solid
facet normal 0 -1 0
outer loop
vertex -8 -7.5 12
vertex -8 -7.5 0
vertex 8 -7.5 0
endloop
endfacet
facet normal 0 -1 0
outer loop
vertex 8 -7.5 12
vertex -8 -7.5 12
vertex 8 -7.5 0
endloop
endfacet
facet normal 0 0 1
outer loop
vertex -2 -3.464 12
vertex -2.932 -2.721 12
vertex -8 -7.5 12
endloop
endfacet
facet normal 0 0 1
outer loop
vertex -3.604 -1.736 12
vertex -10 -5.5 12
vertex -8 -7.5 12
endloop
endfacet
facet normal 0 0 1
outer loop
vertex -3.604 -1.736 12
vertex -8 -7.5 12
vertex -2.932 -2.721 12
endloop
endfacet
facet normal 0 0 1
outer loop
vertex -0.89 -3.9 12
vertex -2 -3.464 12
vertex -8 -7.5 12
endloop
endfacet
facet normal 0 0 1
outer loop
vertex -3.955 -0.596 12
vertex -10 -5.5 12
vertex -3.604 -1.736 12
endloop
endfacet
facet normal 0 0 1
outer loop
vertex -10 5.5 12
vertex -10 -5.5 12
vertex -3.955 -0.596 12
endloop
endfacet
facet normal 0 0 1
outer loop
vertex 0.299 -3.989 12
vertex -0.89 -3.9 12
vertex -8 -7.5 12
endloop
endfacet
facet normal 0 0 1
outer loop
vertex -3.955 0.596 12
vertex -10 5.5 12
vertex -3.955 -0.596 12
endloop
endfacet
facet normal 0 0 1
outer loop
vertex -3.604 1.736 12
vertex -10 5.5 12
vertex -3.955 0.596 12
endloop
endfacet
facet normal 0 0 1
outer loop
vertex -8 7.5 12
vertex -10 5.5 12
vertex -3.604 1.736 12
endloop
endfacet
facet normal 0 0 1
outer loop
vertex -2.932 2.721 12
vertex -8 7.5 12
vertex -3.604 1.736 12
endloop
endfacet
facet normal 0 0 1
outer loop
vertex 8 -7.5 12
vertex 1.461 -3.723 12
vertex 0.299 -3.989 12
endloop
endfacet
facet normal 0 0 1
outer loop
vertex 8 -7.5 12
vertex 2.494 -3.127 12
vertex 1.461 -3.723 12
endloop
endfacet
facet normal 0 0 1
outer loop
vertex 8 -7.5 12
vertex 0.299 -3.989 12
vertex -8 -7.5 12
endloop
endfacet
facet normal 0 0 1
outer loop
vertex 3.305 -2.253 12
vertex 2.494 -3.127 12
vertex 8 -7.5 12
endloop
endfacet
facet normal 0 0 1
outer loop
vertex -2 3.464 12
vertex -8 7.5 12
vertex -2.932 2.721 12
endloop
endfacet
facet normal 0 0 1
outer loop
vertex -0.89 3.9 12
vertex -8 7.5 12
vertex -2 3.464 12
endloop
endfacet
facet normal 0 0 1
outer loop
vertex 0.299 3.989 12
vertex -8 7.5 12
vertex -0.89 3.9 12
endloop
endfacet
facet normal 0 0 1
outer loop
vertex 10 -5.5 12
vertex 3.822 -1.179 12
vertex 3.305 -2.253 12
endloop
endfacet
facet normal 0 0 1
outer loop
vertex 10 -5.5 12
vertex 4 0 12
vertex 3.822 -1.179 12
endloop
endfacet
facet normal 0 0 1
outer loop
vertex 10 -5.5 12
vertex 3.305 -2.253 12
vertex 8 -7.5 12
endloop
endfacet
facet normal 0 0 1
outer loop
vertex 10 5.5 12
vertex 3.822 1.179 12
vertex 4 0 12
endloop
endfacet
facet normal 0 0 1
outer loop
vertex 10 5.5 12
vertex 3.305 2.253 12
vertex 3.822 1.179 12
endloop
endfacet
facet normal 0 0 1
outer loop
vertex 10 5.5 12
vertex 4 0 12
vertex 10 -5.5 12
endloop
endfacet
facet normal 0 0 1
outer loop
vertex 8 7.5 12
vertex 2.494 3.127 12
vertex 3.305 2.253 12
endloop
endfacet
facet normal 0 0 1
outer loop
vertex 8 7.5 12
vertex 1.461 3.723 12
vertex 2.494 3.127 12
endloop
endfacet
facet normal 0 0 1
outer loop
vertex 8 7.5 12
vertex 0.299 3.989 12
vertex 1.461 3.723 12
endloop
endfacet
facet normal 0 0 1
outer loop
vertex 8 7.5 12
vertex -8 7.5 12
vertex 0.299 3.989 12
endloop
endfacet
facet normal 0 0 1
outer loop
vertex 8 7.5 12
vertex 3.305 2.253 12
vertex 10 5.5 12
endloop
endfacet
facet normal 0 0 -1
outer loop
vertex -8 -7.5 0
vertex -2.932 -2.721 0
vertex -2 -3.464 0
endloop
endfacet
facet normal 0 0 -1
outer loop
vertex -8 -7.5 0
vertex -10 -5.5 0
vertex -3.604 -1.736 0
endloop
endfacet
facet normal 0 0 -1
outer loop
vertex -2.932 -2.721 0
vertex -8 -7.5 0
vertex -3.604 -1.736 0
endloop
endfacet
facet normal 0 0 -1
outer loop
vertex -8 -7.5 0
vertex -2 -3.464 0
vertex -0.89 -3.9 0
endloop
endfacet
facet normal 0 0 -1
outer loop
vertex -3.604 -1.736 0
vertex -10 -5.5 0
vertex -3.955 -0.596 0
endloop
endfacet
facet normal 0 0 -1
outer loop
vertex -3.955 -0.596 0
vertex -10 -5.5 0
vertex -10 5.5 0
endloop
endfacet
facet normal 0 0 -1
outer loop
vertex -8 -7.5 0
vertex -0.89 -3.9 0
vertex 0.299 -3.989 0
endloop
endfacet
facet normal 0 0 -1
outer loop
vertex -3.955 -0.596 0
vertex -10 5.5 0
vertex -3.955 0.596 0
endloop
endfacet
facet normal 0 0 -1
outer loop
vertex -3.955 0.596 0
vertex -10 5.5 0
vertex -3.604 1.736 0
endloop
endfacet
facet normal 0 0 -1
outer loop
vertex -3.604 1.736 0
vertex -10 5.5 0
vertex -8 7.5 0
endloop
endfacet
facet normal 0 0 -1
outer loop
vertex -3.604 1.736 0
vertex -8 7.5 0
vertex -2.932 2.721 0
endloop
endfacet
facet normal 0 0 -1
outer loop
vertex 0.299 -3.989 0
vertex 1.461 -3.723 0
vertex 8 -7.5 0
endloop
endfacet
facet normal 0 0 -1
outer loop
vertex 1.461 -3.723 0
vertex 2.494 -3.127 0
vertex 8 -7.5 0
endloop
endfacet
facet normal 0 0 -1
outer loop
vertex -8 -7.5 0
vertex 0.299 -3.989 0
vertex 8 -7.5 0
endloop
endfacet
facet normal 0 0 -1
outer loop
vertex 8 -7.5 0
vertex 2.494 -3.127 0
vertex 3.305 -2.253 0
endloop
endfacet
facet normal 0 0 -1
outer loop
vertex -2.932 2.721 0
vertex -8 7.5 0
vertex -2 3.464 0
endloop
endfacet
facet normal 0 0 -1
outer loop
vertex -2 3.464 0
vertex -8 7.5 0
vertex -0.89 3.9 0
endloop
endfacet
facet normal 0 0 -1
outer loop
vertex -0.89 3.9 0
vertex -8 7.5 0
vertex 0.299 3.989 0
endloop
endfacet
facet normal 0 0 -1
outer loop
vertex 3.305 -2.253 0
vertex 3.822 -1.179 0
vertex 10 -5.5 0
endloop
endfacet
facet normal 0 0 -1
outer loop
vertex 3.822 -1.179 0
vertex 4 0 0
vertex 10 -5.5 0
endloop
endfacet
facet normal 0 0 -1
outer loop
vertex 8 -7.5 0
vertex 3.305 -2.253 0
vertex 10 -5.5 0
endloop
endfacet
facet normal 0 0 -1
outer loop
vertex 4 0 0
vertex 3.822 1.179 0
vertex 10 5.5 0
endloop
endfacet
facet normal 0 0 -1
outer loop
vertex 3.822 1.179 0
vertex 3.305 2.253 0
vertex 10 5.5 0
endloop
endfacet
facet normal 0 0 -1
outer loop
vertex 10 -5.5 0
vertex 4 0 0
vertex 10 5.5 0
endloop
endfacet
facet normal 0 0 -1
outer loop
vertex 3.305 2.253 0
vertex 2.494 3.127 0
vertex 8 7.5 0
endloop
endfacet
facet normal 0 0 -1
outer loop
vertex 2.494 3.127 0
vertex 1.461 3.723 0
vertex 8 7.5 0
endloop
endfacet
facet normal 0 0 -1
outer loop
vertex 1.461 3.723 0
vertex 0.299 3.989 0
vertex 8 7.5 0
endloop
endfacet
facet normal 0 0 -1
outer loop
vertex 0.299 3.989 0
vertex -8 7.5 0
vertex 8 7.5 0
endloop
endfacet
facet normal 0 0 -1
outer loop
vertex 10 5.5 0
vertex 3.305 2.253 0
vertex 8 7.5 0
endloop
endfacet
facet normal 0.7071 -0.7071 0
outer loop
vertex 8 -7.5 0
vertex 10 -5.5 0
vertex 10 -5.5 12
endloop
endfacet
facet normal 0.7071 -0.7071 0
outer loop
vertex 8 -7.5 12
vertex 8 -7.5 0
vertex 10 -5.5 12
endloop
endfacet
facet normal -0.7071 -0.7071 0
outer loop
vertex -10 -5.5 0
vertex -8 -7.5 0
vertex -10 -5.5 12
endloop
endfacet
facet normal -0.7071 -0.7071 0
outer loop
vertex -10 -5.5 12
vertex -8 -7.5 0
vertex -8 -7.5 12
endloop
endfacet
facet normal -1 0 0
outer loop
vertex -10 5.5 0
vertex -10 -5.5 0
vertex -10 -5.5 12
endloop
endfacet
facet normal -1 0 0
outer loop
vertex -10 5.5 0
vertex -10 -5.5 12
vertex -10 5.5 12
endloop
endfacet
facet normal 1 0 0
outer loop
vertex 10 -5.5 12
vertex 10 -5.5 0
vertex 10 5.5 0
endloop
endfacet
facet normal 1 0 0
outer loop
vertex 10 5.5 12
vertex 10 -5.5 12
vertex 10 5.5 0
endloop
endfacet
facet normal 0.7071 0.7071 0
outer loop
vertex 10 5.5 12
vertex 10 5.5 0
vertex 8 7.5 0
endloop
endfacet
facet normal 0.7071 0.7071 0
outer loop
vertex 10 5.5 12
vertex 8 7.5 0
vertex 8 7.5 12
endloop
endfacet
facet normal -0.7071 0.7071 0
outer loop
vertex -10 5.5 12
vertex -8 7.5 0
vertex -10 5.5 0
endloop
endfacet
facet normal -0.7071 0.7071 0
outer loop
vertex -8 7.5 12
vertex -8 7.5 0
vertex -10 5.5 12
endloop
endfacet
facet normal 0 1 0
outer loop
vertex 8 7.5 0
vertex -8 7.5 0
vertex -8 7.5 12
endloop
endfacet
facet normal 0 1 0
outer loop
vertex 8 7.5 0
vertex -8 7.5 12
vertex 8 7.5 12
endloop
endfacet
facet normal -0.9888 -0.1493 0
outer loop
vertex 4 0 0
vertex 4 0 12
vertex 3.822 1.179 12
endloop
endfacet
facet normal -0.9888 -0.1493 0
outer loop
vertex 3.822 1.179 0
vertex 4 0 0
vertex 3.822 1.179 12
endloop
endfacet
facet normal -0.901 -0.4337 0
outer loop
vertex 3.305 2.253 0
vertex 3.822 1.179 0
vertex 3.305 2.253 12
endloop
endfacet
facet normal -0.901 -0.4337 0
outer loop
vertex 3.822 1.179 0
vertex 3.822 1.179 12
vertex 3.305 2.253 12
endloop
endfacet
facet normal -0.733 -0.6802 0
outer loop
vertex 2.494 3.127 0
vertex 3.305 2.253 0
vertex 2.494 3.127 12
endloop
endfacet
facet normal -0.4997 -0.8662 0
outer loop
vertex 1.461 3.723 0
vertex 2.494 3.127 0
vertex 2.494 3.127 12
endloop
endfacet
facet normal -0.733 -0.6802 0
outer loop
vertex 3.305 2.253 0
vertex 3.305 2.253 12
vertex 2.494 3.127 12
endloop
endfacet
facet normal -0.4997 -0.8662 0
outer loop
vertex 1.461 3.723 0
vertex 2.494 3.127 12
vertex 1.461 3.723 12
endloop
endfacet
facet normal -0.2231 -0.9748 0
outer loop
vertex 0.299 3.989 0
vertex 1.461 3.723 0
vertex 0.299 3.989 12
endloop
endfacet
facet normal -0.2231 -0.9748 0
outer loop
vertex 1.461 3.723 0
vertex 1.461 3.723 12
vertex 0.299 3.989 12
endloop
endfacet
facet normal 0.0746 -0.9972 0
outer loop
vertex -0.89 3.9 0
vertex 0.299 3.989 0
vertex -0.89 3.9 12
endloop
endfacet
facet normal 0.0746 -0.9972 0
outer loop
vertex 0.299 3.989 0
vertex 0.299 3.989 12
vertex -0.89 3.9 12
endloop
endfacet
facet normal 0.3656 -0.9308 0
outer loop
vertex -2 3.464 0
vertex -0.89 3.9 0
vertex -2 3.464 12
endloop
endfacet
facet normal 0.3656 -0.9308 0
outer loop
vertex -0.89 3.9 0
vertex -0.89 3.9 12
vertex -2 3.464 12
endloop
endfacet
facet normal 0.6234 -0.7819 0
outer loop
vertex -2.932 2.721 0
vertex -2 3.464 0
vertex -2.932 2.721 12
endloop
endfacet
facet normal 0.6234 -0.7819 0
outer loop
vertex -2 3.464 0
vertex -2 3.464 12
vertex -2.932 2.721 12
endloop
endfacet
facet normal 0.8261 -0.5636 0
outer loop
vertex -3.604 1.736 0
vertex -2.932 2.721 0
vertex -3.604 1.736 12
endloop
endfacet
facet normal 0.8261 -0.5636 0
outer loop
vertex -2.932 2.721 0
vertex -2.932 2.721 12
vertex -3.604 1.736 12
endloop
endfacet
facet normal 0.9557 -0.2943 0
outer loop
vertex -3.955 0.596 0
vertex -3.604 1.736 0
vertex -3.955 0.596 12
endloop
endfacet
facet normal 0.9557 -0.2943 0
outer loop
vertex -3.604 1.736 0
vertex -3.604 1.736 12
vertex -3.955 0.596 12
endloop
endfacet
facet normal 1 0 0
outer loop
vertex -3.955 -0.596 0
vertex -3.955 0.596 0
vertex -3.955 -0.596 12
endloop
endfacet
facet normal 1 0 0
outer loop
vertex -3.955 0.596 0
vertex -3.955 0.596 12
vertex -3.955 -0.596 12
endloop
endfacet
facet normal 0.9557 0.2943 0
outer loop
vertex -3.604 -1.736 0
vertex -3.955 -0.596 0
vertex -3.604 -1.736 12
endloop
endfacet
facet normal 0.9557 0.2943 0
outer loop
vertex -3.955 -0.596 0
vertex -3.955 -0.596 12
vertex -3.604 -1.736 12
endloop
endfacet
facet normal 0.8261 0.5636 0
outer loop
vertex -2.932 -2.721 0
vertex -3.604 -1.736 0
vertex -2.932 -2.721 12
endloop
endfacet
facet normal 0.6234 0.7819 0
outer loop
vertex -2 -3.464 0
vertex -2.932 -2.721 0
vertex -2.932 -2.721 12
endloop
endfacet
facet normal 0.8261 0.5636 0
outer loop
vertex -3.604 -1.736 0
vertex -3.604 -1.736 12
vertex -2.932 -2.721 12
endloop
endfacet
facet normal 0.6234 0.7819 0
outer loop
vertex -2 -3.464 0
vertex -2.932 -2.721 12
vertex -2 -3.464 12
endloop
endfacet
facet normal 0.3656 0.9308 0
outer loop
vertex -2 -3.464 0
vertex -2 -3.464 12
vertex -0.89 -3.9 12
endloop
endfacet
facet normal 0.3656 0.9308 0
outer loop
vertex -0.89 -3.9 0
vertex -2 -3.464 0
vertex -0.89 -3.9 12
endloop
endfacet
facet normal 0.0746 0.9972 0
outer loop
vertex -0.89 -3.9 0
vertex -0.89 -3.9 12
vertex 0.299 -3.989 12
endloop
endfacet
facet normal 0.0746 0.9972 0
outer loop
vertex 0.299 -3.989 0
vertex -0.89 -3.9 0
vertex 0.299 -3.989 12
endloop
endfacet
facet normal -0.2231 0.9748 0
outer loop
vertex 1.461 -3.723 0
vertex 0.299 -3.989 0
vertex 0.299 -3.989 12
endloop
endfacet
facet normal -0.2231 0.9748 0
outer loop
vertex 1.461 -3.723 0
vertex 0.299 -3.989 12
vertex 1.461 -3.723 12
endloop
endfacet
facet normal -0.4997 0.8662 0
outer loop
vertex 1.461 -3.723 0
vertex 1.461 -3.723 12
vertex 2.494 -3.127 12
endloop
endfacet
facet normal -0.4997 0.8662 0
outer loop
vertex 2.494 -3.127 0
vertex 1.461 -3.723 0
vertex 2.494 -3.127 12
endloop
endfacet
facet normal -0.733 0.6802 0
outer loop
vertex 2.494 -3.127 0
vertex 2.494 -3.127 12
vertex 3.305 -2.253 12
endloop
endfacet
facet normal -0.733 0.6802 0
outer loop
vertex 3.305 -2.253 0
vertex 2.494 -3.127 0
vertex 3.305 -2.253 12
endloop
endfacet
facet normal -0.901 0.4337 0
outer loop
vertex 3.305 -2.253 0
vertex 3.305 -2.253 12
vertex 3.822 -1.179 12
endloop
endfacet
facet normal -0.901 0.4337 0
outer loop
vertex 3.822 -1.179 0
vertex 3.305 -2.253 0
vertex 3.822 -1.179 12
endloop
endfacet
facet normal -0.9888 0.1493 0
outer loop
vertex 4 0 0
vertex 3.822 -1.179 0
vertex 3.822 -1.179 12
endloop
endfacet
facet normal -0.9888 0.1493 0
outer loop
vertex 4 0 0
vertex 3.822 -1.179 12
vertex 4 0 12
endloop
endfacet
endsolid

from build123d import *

# Parameters (mm, degrees)
SKETCH1_W           = 20
SKETCH1_H           = 15
BOSS_EXTRUDE1_DEPTH = 12
SKETCH2_R           = 4
CUT_EXTRUDE1_DEPTH  = 13
CHAMFER1_SIZE       = 2


with BuildPart() as part:
    # Sketch1 → Boss-Extrude1 (new body)
    with BuildSketch(Plane.XY):
        Rectangle(SKETCH1_W, SKETCH1_H)
    extrude(amount=BOSS_EXTRUDE1_DEPTH)

    # Sketch2 → Cut-Extrude1 (cut, through all)
    with BuildSketch(Plane.XY.offset(12)):
        Circle(SKETCH2_R)
    extrude(amount=-CUT_EXTRUDE1_DEPTH, mode=Mode.SUBTRACT)

    # Chamfer1
    chamfer1_edges = [part.edges().sort_by_distance(p)[0] for p in [
        (10, 7.5, 6),
        (10, -7.5, 6),
        (-10, -7.5, 6),
        (-10, 7.5, 6),
    ]]
    chamfer(chamfer1_edges, length=CHAMFER1_SIZE)


solid = part.part
